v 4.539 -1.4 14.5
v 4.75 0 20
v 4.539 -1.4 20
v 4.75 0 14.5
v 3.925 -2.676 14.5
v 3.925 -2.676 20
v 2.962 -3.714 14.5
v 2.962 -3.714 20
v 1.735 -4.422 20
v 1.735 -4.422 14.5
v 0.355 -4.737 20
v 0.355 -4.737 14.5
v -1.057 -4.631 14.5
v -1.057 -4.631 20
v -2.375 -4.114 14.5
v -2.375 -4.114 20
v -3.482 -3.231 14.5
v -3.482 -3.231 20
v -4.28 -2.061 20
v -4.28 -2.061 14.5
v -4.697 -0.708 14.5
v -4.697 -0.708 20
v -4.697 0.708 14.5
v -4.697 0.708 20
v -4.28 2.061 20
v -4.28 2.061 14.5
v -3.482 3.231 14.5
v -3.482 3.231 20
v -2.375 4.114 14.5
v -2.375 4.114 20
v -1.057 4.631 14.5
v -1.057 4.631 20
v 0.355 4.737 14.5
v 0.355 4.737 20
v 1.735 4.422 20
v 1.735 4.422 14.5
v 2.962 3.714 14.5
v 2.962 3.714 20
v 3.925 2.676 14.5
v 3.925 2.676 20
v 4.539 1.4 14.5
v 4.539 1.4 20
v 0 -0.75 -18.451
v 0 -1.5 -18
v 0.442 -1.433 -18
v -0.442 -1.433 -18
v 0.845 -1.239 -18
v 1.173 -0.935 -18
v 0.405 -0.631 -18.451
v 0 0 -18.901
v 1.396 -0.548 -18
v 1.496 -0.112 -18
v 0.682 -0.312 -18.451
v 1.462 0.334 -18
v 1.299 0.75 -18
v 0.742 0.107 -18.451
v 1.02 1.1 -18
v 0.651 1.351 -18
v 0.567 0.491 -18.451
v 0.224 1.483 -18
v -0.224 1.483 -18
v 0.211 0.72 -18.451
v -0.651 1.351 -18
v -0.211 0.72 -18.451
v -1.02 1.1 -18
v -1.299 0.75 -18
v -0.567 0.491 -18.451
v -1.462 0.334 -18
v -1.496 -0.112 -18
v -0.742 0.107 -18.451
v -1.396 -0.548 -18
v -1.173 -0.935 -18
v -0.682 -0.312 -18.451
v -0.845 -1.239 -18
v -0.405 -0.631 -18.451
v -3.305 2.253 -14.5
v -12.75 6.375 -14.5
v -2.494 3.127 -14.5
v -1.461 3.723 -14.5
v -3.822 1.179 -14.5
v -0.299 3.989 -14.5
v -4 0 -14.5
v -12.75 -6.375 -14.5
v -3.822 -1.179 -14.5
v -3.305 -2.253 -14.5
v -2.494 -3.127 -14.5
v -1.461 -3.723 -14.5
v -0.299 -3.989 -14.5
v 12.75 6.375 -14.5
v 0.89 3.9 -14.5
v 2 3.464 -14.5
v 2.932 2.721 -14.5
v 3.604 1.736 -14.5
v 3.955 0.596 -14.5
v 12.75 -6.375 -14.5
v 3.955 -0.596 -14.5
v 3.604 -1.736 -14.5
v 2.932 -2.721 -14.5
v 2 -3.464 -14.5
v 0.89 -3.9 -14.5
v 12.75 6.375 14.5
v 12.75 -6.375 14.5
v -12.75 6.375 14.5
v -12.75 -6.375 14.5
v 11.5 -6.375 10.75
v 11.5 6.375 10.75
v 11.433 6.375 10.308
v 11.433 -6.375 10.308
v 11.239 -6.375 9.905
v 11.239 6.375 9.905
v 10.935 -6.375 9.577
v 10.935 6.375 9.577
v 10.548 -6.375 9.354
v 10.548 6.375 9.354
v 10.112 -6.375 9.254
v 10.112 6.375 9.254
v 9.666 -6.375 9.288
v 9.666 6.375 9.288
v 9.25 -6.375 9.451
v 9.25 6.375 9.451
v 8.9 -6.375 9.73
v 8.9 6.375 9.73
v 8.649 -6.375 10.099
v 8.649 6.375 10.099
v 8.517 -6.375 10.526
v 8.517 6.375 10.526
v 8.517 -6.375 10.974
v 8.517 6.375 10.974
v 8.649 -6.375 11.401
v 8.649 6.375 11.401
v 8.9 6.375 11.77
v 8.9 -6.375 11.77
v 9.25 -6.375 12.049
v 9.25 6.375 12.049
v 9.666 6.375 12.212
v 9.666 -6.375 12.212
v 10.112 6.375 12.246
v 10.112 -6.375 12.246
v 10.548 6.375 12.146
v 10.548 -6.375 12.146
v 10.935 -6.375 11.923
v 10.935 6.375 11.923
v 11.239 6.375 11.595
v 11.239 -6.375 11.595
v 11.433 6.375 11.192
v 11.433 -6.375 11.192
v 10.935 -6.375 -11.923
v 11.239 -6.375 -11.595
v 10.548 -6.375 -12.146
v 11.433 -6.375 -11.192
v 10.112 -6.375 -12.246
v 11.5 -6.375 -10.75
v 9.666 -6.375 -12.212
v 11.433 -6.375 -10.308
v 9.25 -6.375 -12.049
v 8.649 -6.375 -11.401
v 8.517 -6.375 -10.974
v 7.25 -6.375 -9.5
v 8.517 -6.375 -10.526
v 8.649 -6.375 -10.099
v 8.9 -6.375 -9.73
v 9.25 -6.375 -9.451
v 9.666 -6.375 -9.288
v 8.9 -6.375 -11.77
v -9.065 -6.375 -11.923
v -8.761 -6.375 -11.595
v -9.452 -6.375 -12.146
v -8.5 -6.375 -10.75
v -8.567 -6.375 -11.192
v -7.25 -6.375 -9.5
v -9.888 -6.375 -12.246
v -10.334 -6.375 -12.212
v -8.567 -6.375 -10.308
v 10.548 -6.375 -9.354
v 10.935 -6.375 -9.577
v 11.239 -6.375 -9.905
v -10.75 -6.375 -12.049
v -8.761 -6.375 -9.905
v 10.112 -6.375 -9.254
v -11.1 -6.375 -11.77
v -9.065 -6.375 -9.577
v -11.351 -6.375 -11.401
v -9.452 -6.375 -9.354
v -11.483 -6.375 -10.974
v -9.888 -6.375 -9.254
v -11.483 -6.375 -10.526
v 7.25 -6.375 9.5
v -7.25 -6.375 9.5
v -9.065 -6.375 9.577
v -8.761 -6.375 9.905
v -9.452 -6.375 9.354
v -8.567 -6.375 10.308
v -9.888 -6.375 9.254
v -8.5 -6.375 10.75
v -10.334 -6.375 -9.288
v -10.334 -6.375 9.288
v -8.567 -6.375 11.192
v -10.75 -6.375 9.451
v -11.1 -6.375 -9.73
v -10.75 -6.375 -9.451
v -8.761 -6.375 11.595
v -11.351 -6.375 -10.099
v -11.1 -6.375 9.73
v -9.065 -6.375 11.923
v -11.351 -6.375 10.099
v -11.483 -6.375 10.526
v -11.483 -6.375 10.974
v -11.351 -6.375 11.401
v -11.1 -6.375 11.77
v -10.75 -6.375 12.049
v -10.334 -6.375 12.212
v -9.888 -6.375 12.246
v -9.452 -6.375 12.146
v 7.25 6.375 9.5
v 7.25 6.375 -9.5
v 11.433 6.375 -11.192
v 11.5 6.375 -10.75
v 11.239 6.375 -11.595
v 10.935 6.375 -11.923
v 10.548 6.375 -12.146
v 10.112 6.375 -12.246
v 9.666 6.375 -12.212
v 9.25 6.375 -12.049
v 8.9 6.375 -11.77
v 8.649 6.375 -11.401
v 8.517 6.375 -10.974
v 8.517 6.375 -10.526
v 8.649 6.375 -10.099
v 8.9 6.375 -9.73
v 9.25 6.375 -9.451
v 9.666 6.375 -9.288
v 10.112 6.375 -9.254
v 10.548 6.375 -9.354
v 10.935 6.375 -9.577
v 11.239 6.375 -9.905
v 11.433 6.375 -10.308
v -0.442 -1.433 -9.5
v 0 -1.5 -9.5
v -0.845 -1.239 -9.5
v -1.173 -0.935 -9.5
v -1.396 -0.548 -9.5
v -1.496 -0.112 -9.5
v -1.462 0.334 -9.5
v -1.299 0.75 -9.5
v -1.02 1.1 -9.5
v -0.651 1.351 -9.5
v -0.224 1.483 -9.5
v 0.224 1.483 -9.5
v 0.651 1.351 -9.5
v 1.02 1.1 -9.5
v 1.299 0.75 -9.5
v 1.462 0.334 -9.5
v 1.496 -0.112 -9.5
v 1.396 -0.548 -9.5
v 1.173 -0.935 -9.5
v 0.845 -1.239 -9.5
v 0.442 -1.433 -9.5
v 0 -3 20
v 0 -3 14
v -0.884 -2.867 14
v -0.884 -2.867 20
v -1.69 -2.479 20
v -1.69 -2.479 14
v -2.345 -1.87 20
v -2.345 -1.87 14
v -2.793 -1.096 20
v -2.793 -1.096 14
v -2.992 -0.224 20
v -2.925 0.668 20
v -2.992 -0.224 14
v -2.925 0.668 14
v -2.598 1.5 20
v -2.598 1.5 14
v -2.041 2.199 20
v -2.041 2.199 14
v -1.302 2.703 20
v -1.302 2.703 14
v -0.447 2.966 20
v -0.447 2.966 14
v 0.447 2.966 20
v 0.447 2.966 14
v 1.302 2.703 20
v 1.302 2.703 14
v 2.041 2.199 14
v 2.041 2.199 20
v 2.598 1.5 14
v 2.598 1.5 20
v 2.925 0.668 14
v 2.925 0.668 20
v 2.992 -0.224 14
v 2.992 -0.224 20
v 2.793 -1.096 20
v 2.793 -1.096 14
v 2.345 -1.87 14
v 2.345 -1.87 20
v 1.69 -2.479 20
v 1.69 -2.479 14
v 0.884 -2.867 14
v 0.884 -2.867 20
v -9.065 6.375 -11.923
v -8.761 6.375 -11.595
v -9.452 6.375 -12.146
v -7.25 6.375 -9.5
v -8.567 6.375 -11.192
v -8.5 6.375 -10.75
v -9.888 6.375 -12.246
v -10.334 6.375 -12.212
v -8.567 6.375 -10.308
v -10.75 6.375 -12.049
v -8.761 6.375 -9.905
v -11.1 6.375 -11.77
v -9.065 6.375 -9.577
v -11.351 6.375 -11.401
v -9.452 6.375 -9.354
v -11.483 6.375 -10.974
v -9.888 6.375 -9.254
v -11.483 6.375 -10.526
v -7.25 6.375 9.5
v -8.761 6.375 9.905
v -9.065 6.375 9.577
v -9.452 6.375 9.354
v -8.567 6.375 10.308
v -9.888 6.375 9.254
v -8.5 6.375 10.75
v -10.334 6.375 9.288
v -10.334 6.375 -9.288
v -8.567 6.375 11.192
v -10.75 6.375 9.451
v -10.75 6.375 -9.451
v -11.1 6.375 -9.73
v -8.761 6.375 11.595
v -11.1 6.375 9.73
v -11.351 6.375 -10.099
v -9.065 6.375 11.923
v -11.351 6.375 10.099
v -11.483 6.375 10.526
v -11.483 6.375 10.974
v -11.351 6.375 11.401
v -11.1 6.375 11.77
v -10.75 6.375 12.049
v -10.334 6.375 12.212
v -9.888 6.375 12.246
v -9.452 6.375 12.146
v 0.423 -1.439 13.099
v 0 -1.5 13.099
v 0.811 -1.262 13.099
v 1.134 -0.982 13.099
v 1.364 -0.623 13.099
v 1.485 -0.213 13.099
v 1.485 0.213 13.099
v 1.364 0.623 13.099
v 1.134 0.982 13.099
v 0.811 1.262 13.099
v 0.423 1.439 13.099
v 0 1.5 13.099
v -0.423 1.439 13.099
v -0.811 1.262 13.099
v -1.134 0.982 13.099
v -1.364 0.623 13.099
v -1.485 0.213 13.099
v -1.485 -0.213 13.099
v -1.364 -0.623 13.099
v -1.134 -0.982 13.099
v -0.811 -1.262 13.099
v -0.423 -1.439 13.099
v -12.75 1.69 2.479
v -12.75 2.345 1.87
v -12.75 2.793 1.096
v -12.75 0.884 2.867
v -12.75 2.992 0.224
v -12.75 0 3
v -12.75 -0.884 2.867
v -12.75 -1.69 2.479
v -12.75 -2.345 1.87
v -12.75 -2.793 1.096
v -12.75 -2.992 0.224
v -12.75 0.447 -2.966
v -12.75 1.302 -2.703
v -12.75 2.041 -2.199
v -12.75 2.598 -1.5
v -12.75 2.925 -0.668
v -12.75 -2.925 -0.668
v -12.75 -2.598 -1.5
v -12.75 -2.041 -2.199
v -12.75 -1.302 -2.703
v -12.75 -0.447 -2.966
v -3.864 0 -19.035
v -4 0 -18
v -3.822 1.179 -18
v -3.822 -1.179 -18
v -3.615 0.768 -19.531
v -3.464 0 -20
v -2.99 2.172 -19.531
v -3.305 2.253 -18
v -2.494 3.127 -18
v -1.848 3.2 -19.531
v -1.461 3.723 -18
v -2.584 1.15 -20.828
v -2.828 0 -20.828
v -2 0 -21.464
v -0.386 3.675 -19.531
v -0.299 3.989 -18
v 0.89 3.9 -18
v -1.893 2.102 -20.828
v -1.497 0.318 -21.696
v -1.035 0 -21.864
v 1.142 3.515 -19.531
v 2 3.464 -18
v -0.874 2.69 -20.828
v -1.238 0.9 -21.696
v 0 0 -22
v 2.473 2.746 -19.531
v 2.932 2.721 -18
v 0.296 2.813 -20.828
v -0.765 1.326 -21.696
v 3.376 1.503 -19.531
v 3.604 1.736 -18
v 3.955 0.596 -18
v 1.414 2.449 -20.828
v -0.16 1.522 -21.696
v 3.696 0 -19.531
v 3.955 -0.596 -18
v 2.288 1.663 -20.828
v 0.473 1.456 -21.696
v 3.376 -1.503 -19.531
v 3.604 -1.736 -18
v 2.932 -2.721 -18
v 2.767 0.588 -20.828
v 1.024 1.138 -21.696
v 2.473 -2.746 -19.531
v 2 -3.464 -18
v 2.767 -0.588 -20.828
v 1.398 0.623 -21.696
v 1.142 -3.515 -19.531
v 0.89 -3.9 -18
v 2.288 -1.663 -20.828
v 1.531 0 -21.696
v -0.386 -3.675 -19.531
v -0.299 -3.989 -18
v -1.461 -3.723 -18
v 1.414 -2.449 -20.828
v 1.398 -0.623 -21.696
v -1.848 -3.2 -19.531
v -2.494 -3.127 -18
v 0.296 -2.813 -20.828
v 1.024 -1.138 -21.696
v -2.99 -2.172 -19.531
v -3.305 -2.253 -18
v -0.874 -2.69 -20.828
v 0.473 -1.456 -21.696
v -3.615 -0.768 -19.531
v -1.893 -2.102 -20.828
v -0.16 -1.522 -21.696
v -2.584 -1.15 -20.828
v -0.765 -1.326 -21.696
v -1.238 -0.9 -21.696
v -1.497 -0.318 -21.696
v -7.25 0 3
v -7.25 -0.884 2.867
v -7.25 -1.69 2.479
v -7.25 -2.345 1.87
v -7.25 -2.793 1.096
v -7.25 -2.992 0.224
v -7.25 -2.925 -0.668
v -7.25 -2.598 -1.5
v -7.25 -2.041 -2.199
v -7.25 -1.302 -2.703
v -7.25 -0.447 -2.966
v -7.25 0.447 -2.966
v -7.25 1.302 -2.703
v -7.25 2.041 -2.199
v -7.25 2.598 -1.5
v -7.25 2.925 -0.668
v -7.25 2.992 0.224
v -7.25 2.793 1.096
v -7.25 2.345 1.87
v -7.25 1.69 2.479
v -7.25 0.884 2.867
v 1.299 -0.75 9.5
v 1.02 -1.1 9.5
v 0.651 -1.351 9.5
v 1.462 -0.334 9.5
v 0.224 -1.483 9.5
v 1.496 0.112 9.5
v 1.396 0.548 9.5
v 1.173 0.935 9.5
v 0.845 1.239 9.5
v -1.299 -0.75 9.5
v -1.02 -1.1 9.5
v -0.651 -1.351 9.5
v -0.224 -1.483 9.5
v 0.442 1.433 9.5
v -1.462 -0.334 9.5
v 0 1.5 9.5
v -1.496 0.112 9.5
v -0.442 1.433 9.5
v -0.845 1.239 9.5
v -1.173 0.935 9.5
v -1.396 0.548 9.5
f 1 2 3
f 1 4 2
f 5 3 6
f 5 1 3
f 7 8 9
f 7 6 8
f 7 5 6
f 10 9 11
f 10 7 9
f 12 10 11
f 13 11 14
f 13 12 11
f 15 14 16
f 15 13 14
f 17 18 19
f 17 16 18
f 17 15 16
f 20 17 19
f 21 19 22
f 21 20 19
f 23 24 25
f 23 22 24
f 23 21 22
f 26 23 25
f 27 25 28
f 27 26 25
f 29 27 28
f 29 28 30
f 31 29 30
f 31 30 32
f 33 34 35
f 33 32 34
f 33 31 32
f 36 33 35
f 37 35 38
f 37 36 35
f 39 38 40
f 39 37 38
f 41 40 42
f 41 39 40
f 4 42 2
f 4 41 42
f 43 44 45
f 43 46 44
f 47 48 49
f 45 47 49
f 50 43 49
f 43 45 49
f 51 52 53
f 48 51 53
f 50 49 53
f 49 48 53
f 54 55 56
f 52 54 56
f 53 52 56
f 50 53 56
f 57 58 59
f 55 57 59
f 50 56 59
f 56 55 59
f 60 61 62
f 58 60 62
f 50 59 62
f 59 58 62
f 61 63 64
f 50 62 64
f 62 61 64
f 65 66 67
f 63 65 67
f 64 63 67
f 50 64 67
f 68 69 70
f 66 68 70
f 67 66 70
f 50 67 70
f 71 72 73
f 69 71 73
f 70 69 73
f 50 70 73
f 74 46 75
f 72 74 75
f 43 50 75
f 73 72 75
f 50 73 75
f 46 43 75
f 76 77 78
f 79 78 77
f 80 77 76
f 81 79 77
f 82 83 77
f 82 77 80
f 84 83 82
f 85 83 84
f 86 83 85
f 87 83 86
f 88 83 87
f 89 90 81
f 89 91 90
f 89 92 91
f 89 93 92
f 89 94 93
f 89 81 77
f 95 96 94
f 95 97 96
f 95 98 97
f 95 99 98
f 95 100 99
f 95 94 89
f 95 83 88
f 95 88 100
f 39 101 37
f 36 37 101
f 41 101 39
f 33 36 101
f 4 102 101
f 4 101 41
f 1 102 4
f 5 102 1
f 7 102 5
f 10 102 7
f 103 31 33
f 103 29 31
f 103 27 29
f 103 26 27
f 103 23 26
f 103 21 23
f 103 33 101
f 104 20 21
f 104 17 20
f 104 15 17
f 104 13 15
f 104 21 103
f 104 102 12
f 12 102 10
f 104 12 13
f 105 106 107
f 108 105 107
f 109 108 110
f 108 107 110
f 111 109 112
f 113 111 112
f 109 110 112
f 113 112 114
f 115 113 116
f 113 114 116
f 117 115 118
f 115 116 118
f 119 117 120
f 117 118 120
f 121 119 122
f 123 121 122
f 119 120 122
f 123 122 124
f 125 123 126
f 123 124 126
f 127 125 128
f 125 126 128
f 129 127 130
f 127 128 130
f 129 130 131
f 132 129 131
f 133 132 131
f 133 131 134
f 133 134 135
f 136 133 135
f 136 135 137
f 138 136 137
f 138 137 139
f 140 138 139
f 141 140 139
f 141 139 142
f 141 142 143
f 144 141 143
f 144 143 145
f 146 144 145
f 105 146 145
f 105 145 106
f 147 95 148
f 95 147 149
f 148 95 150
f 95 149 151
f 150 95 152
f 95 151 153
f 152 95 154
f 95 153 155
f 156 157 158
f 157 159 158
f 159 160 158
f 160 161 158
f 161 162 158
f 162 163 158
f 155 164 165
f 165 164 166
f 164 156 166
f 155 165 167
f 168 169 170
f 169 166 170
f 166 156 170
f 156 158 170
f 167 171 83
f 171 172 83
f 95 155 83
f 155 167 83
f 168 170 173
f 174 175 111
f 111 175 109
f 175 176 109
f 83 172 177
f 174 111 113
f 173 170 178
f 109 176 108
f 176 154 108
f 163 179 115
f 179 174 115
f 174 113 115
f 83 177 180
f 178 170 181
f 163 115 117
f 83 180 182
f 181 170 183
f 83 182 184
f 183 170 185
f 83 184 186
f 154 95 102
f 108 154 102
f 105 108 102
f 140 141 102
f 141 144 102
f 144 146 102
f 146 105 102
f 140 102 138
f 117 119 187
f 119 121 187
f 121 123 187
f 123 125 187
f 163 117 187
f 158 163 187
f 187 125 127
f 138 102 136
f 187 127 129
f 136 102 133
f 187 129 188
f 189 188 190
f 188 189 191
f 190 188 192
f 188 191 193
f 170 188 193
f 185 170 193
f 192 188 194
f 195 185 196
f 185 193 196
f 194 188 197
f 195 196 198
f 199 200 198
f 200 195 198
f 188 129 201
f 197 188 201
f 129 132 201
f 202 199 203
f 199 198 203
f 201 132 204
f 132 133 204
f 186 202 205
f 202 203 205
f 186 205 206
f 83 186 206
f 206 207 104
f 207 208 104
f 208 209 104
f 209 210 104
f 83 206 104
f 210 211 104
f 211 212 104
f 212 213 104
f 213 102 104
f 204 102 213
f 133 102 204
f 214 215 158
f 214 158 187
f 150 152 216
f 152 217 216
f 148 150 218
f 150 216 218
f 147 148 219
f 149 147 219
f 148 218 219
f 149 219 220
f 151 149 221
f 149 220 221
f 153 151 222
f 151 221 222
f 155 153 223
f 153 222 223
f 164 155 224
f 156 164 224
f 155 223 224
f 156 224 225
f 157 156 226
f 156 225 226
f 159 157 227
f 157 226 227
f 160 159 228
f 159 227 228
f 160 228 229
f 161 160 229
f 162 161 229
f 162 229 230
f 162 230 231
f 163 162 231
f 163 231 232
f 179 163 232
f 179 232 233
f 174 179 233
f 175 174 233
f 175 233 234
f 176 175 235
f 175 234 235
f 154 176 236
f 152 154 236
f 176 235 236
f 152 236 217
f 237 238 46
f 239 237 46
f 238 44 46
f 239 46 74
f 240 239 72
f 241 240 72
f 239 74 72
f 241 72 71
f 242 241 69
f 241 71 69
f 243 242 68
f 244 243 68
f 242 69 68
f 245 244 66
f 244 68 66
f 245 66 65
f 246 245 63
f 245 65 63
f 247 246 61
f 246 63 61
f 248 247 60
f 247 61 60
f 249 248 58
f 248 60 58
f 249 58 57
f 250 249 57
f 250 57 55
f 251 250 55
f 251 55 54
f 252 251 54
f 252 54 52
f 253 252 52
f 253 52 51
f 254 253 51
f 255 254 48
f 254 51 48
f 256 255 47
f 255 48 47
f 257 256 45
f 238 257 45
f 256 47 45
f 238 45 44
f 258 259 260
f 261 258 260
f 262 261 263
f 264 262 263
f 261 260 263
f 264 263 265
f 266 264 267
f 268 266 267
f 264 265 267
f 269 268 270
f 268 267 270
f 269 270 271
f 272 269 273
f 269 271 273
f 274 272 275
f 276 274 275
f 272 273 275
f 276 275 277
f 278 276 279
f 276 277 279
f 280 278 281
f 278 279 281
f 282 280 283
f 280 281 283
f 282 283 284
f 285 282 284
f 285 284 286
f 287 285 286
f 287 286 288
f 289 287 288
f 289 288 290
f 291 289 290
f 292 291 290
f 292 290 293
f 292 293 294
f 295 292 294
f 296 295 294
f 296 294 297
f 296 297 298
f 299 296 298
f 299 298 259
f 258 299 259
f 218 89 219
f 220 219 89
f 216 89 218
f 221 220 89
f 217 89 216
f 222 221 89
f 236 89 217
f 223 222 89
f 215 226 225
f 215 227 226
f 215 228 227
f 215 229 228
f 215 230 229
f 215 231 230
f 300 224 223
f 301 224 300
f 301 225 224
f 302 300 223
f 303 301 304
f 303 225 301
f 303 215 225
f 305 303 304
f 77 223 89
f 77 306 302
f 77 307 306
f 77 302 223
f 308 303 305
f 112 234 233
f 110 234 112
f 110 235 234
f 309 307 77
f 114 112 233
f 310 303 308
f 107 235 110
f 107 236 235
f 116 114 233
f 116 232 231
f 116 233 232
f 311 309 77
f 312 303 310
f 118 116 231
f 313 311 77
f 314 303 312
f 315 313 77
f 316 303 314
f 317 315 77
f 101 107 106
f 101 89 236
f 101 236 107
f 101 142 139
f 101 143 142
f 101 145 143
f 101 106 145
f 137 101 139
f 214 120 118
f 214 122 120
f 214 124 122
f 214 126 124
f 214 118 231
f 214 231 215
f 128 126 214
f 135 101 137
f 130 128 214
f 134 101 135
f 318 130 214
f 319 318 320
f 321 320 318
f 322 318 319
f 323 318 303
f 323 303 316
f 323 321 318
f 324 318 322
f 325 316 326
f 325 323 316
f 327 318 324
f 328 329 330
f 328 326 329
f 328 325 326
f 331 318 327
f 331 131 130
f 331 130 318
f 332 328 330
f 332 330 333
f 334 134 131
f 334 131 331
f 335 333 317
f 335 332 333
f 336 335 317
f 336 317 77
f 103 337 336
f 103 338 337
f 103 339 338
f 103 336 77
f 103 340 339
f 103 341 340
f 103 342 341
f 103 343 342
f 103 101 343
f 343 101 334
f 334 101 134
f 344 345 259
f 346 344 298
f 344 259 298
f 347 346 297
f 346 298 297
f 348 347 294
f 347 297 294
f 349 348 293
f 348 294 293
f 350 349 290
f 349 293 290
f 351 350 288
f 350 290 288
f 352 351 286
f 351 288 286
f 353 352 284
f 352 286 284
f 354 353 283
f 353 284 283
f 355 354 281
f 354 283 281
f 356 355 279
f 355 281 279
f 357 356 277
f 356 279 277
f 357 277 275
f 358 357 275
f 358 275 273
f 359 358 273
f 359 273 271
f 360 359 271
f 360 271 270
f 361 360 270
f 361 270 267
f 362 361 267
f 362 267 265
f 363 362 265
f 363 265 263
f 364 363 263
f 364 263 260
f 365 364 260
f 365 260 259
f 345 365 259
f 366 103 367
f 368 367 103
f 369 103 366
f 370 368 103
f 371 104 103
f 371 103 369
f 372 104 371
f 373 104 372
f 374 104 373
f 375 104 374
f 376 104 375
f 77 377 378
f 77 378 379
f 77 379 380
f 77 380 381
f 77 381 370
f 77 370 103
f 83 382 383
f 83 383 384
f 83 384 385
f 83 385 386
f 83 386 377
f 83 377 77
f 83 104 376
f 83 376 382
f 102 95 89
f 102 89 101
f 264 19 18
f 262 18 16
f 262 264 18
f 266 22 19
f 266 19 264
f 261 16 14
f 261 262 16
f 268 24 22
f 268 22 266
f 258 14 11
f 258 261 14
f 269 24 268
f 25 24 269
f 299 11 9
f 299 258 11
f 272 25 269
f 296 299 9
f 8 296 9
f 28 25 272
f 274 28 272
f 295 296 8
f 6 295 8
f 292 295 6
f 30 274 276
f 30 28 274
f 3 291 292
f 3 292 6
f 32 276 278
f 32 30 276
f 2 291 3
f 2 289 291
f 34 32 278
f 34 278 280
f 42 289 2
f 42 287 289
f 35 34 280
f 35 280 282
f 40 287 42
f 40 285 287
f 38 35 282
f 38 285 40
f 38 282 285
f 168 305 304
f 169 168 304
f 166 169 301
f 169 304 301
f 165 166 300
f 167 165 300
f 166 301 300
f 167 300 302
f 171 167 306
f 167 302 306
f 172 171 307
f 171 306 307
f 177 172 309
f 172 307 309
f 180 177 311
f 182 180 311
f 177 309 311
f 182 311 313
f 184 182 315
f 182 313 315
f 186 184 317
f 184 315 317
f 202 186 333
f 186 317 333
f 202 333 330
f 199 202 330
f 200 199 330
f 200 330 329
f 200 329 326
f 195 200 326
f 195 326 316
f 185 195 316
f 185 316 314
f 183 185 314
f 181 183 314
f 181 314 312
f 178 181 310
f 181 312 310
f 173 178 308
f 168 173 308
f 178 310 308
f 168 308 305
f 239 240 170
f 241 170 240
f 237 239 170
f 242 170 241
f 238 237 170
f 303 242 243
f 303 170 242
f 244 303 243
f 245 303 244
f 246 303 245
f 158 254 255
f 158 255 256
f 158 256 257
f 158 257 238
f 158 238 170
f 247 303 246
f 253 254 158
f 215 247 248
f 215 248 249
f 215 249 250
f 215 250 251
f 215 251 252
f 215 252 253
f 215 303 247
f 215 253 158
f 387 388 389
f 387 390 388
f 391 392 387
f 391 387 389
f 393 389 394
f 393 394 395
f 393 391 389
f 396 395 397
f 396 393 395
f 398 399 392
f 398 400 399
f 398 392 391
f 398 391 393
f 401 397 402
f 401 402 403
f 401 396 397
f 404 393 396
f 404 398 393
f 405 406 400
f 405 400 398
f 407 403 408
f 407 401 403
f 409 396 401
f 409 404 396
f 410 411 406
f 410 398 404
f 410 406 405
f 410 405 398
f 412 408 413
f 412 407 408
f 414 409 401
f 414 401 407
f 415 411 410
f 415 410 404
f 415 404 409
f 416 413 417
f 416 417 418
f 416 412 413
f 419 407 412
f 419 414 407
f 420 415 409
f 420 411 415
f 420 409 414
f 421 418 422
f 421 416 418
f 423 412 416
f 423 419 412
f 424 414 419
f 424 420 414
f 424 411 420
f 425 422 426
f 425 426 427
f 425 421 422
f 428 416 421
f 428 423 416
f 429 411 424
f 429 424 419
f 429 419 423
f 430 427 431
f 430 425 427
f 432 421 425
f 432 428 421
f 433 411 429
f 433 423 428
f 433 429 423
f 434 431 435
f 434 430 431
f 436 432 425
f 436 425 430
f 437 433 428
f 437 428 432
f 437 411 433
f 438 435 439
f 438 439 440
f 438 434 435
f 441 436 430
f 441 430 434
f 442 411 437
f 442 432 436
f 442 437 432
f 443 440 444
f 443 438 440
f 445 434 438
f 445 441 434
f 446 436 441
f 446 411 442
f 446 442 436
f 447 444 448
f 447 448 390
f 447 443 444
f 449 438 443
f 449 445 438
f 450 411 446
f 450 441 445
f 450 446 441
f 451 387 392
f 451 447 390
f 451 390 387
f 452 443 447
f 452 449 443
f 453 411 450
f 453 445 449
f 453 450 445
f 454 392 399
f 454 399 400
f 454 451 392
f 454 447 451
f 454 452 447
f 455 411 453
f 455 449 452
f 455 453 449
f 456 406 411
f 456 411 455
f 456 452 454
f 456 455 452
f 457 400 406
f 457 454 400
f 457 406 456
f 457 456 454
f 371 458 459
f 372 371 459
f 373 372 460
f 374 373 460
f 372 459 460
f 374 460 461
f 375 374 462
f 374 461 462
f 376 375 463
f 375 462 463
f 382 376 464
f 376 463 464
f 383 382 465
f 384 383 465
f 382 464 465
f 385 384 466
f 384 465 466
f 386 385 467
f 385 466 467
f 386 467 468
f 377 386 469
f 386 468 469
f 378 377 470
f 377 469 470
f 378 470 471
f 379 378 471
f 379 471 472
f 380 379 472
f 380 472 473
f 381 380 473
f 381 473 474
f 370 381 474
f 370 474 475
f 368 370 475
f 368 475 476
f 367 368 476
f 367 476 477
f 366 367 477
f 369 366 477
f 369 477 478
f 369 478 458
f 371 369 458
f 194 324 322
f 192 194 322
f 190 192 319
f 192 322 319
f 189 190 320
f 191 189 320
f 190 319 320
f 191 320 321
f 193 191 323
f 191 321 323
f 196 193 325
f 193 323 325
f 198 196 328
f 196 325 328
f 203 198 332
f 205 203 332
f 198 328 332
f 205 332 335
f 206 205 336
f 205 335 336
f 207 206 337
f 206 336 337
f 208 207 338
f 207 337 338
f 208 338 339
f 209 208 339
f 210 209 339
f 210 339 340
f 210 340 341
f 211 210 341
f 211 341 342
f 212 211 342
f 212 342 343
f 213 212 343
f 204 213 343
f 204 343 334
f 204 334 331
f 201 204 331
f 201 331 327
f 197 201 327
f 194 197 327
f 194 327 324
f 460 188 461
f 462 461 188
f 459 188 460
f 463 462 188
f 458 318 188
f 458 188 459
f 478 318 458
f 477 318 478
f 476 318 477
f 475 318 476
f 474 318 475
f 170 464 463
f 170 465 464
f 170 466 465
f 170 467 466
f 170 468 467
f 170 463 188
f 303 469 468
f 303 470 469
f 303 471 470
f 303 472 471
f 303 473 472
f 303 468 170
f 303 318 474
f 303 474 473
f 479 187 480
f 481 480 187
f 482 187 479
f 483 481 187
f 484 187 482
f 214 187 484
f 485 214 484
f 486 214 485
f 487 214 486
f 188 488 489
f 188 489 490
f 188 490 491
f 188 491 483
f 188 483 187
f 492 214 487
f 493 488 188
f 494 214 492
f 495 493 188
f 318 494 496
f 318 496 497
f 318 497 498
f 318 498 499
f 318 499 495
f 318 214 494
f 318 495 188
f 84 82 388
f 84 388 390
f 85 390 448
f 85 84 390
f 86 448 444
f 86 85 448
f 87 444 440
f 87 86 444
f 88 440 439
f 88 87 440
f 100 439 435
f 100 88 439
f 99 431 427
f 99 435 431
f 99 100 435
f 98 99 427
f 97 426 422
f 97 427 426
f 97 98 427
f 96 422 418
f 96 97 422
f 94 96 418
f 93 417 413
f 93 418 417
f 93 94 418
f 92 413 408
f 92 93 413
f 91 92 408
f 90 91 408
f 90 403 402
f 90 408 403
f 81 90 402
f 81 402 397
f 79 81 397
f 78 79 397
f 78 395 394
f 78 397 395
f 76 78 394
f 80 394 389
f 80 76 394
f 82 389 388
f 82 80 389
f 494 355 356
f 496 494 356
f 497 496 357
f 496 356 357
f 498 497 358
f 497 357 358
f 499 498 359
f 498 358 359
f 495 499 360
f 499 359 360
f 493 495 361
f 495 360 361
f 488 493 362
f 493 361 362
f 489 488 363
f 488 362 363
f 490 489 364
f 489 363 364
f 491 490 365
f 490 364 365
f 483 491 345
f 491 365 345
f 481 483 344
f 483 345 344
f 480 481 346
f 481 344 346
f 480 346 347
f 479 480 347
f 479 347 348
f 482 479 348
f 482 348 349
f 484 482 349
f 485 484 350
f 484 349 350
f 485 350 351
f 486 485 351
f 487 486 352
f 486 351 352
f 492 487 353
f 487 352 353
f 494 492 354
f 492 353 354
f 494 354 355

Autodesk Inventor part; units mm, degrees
ref_plane "YZ Plane" through (0, 0, 0) normal (1, 0, 0) x (0, 1, 0)
ref_plane "XZ Plane" through (0, 0, 0) normal (0, 1, 0) x (-1, 0, 0)
ref_plane "XY Plane" through (0, 0, 0) normal (0, 0, 1) x (1, 0, 0)
sketch "Sketch1" plane through (0, 0, 0) normal (0, 1, 0) x (-1, 0, 0)
  line L0 (12.75, -14.5) -> (-12.75, -14.5)
  line L1 (-12.75, -14.5) -> (-12.75, 14.5)
  line L2 (-12.75, 14.5) -> (12.75, 14.5)
  line L3 (12.75, 14.5) -> (12.75, -14.5)
  line L4 (12.75, -14.5) -> (-12.75, 14.5) construction
  line L5 (-12.75, -14.5) -> (12.75, 14.5) construction
  point P0 (0, 0)
  dimension "d0" = 25.5
  dimension "d1" = 29
extrude "Extrusion1" add sketch "Sketch1" along normal mid plane 12.75
sketch "Sketch2" plane through (0, 6.375, 0) normal (0, 1, 0) x (1, 0, 0)
  line L0 (-7.25, 9.5) -> (7.25, 9.5)
  line L1 (7.25, 9.5) -> (7.25, -9.5)
  line L2 (7.25, -9.5) -> (-7.25, -9.5)
  line L3 (-7.25, -9.5) -> (-7.25, 9.5)
  line L4 (-7.25, 9.5) -> (7.25, -9.5) construction
  line L5 (7.25, 9.5) -> (-7.25, -9.5) construction
  point P0 (0, 0)
  dimension "d4" = 14.5
  dimension "d5" = 19
extrude "Extrusion2" cut sketch "Sketch2" against normal blind 12.75
sketch "Sketch3" plane through (0, 6.375, 0) normal (0, 1, 0) x (1, 0, 0)
  circle A0 centre (10, 10.75) radius 1.5
  line L0 (12.75, 14.5) -> (-12.75, 14.5) projected
  line L1 (12.75, -14.5) -> (12.75, 14.5) projected
  circle A1 centre (-10, 10.75) radius 1.5
  circle A2 centre (10, -10.75) radius 1.5
  circle A3 centre (-10, -10.75) radius 1.5
  point P0 (0, 0)
  dimension "d8" = 3
  dimension "d9" = 3.75
  dimension "d10" = 2.75
  dimension "d13" = 20
  dimension "d16" = 21.5
sketch "Sketch4" plane through (-12.75, 6.375, 14.5) normal (0, 0, 1) x (1, 0, 0)
  circle A0 centre (12.75, -6.375) radius 4.75
  dimension "d19" = 9.5
extrude "Extrusion3" add sketch "Sketch4" along normal blind 5.5
extrude "Extrusion6" cut sketch "Sketch3" against normal through all
sketch "Sketch7" plane through (12.75, 6.375, -14.5) normal (0, 0, -1) x (-1, 0, 0)
  circle A0 centre (12.75, -6.375) radius 1.2632
  circle A1 centre (12.75, -6.375) radius 4
  point P0 (12.75, -6.375)
  dimension "d32" = 8
extrude "Extrusion7" add sketch "Sketch7" along normal blind 7.5 contours A0 | A1
sketch "Sketch8" plane through (-12.75, -6.375, 14.5) normal (-1, 0, 0) x (0, 0, 1)
  circle A0 centre (-14.5, 6.375) radius 3
  dimension "d35" = 6
hole "Hole1" at (-12.75, 0, 0) direction (1, 0, 0) diameter 6 depth 8 tip angle 118
thread "Thread2" size "M6x1" class "6H" standard "ANSI Metric M Profile" full length
fillet "Fillet1" [suppressed]
sketch "Sketch10" plane through (0, 0, 20) normal (0, 0, 1) x (1, 0, 0)
  circle A0 centre (0, 0) radius 1.5 projected
  point P0 (0, 0)
hole "Hole2" at (0, 0, 20) direction (0, 0, -1) diameter 6 depth 6 tip angle 118
sketch "Sketch11" plane through (7.25, 6.375, 9.5) normal (0, 0, -1) x (-1, 0, 0)
  circle A0 centre (7.25, -6.375) radius 1.5 projected
hole "Hole3" at (0, 0, 9.5) direction (0, 0, 1) diameter 3 end through all
thread "Thread3" size "M6x1" class "6H" standard "ANSI Metric M Profile" full length
fillet "Fillet2" radius 4 1 edges at (4, 0, -22)
sketch "Sketch12" plane through (-7.25, 6.375, -9.5) normal (0, 0, 1) x (1, 0, 0)
  point P0 (7.25, -6.375)
  point P1 (7.25, -6.375)
sketch "Sketch13" plane through (0, 0, 0) normal (0, 1, 0) x (-1, 0, 0)
  line L0 (-4, -18) -> (4, -18) projected
  line L1 (4.75, 20) -> (-4.75, 20) projected
  point P0 (0, 0)
  point P1 (0, -18)
  dimension "d67" = 38
hole "Hole4" at (0, 0, -9.5) direction (0, 0, -1) diameter 3 depth 8.5 tip angle 118
properties material "Iron, Cast"
